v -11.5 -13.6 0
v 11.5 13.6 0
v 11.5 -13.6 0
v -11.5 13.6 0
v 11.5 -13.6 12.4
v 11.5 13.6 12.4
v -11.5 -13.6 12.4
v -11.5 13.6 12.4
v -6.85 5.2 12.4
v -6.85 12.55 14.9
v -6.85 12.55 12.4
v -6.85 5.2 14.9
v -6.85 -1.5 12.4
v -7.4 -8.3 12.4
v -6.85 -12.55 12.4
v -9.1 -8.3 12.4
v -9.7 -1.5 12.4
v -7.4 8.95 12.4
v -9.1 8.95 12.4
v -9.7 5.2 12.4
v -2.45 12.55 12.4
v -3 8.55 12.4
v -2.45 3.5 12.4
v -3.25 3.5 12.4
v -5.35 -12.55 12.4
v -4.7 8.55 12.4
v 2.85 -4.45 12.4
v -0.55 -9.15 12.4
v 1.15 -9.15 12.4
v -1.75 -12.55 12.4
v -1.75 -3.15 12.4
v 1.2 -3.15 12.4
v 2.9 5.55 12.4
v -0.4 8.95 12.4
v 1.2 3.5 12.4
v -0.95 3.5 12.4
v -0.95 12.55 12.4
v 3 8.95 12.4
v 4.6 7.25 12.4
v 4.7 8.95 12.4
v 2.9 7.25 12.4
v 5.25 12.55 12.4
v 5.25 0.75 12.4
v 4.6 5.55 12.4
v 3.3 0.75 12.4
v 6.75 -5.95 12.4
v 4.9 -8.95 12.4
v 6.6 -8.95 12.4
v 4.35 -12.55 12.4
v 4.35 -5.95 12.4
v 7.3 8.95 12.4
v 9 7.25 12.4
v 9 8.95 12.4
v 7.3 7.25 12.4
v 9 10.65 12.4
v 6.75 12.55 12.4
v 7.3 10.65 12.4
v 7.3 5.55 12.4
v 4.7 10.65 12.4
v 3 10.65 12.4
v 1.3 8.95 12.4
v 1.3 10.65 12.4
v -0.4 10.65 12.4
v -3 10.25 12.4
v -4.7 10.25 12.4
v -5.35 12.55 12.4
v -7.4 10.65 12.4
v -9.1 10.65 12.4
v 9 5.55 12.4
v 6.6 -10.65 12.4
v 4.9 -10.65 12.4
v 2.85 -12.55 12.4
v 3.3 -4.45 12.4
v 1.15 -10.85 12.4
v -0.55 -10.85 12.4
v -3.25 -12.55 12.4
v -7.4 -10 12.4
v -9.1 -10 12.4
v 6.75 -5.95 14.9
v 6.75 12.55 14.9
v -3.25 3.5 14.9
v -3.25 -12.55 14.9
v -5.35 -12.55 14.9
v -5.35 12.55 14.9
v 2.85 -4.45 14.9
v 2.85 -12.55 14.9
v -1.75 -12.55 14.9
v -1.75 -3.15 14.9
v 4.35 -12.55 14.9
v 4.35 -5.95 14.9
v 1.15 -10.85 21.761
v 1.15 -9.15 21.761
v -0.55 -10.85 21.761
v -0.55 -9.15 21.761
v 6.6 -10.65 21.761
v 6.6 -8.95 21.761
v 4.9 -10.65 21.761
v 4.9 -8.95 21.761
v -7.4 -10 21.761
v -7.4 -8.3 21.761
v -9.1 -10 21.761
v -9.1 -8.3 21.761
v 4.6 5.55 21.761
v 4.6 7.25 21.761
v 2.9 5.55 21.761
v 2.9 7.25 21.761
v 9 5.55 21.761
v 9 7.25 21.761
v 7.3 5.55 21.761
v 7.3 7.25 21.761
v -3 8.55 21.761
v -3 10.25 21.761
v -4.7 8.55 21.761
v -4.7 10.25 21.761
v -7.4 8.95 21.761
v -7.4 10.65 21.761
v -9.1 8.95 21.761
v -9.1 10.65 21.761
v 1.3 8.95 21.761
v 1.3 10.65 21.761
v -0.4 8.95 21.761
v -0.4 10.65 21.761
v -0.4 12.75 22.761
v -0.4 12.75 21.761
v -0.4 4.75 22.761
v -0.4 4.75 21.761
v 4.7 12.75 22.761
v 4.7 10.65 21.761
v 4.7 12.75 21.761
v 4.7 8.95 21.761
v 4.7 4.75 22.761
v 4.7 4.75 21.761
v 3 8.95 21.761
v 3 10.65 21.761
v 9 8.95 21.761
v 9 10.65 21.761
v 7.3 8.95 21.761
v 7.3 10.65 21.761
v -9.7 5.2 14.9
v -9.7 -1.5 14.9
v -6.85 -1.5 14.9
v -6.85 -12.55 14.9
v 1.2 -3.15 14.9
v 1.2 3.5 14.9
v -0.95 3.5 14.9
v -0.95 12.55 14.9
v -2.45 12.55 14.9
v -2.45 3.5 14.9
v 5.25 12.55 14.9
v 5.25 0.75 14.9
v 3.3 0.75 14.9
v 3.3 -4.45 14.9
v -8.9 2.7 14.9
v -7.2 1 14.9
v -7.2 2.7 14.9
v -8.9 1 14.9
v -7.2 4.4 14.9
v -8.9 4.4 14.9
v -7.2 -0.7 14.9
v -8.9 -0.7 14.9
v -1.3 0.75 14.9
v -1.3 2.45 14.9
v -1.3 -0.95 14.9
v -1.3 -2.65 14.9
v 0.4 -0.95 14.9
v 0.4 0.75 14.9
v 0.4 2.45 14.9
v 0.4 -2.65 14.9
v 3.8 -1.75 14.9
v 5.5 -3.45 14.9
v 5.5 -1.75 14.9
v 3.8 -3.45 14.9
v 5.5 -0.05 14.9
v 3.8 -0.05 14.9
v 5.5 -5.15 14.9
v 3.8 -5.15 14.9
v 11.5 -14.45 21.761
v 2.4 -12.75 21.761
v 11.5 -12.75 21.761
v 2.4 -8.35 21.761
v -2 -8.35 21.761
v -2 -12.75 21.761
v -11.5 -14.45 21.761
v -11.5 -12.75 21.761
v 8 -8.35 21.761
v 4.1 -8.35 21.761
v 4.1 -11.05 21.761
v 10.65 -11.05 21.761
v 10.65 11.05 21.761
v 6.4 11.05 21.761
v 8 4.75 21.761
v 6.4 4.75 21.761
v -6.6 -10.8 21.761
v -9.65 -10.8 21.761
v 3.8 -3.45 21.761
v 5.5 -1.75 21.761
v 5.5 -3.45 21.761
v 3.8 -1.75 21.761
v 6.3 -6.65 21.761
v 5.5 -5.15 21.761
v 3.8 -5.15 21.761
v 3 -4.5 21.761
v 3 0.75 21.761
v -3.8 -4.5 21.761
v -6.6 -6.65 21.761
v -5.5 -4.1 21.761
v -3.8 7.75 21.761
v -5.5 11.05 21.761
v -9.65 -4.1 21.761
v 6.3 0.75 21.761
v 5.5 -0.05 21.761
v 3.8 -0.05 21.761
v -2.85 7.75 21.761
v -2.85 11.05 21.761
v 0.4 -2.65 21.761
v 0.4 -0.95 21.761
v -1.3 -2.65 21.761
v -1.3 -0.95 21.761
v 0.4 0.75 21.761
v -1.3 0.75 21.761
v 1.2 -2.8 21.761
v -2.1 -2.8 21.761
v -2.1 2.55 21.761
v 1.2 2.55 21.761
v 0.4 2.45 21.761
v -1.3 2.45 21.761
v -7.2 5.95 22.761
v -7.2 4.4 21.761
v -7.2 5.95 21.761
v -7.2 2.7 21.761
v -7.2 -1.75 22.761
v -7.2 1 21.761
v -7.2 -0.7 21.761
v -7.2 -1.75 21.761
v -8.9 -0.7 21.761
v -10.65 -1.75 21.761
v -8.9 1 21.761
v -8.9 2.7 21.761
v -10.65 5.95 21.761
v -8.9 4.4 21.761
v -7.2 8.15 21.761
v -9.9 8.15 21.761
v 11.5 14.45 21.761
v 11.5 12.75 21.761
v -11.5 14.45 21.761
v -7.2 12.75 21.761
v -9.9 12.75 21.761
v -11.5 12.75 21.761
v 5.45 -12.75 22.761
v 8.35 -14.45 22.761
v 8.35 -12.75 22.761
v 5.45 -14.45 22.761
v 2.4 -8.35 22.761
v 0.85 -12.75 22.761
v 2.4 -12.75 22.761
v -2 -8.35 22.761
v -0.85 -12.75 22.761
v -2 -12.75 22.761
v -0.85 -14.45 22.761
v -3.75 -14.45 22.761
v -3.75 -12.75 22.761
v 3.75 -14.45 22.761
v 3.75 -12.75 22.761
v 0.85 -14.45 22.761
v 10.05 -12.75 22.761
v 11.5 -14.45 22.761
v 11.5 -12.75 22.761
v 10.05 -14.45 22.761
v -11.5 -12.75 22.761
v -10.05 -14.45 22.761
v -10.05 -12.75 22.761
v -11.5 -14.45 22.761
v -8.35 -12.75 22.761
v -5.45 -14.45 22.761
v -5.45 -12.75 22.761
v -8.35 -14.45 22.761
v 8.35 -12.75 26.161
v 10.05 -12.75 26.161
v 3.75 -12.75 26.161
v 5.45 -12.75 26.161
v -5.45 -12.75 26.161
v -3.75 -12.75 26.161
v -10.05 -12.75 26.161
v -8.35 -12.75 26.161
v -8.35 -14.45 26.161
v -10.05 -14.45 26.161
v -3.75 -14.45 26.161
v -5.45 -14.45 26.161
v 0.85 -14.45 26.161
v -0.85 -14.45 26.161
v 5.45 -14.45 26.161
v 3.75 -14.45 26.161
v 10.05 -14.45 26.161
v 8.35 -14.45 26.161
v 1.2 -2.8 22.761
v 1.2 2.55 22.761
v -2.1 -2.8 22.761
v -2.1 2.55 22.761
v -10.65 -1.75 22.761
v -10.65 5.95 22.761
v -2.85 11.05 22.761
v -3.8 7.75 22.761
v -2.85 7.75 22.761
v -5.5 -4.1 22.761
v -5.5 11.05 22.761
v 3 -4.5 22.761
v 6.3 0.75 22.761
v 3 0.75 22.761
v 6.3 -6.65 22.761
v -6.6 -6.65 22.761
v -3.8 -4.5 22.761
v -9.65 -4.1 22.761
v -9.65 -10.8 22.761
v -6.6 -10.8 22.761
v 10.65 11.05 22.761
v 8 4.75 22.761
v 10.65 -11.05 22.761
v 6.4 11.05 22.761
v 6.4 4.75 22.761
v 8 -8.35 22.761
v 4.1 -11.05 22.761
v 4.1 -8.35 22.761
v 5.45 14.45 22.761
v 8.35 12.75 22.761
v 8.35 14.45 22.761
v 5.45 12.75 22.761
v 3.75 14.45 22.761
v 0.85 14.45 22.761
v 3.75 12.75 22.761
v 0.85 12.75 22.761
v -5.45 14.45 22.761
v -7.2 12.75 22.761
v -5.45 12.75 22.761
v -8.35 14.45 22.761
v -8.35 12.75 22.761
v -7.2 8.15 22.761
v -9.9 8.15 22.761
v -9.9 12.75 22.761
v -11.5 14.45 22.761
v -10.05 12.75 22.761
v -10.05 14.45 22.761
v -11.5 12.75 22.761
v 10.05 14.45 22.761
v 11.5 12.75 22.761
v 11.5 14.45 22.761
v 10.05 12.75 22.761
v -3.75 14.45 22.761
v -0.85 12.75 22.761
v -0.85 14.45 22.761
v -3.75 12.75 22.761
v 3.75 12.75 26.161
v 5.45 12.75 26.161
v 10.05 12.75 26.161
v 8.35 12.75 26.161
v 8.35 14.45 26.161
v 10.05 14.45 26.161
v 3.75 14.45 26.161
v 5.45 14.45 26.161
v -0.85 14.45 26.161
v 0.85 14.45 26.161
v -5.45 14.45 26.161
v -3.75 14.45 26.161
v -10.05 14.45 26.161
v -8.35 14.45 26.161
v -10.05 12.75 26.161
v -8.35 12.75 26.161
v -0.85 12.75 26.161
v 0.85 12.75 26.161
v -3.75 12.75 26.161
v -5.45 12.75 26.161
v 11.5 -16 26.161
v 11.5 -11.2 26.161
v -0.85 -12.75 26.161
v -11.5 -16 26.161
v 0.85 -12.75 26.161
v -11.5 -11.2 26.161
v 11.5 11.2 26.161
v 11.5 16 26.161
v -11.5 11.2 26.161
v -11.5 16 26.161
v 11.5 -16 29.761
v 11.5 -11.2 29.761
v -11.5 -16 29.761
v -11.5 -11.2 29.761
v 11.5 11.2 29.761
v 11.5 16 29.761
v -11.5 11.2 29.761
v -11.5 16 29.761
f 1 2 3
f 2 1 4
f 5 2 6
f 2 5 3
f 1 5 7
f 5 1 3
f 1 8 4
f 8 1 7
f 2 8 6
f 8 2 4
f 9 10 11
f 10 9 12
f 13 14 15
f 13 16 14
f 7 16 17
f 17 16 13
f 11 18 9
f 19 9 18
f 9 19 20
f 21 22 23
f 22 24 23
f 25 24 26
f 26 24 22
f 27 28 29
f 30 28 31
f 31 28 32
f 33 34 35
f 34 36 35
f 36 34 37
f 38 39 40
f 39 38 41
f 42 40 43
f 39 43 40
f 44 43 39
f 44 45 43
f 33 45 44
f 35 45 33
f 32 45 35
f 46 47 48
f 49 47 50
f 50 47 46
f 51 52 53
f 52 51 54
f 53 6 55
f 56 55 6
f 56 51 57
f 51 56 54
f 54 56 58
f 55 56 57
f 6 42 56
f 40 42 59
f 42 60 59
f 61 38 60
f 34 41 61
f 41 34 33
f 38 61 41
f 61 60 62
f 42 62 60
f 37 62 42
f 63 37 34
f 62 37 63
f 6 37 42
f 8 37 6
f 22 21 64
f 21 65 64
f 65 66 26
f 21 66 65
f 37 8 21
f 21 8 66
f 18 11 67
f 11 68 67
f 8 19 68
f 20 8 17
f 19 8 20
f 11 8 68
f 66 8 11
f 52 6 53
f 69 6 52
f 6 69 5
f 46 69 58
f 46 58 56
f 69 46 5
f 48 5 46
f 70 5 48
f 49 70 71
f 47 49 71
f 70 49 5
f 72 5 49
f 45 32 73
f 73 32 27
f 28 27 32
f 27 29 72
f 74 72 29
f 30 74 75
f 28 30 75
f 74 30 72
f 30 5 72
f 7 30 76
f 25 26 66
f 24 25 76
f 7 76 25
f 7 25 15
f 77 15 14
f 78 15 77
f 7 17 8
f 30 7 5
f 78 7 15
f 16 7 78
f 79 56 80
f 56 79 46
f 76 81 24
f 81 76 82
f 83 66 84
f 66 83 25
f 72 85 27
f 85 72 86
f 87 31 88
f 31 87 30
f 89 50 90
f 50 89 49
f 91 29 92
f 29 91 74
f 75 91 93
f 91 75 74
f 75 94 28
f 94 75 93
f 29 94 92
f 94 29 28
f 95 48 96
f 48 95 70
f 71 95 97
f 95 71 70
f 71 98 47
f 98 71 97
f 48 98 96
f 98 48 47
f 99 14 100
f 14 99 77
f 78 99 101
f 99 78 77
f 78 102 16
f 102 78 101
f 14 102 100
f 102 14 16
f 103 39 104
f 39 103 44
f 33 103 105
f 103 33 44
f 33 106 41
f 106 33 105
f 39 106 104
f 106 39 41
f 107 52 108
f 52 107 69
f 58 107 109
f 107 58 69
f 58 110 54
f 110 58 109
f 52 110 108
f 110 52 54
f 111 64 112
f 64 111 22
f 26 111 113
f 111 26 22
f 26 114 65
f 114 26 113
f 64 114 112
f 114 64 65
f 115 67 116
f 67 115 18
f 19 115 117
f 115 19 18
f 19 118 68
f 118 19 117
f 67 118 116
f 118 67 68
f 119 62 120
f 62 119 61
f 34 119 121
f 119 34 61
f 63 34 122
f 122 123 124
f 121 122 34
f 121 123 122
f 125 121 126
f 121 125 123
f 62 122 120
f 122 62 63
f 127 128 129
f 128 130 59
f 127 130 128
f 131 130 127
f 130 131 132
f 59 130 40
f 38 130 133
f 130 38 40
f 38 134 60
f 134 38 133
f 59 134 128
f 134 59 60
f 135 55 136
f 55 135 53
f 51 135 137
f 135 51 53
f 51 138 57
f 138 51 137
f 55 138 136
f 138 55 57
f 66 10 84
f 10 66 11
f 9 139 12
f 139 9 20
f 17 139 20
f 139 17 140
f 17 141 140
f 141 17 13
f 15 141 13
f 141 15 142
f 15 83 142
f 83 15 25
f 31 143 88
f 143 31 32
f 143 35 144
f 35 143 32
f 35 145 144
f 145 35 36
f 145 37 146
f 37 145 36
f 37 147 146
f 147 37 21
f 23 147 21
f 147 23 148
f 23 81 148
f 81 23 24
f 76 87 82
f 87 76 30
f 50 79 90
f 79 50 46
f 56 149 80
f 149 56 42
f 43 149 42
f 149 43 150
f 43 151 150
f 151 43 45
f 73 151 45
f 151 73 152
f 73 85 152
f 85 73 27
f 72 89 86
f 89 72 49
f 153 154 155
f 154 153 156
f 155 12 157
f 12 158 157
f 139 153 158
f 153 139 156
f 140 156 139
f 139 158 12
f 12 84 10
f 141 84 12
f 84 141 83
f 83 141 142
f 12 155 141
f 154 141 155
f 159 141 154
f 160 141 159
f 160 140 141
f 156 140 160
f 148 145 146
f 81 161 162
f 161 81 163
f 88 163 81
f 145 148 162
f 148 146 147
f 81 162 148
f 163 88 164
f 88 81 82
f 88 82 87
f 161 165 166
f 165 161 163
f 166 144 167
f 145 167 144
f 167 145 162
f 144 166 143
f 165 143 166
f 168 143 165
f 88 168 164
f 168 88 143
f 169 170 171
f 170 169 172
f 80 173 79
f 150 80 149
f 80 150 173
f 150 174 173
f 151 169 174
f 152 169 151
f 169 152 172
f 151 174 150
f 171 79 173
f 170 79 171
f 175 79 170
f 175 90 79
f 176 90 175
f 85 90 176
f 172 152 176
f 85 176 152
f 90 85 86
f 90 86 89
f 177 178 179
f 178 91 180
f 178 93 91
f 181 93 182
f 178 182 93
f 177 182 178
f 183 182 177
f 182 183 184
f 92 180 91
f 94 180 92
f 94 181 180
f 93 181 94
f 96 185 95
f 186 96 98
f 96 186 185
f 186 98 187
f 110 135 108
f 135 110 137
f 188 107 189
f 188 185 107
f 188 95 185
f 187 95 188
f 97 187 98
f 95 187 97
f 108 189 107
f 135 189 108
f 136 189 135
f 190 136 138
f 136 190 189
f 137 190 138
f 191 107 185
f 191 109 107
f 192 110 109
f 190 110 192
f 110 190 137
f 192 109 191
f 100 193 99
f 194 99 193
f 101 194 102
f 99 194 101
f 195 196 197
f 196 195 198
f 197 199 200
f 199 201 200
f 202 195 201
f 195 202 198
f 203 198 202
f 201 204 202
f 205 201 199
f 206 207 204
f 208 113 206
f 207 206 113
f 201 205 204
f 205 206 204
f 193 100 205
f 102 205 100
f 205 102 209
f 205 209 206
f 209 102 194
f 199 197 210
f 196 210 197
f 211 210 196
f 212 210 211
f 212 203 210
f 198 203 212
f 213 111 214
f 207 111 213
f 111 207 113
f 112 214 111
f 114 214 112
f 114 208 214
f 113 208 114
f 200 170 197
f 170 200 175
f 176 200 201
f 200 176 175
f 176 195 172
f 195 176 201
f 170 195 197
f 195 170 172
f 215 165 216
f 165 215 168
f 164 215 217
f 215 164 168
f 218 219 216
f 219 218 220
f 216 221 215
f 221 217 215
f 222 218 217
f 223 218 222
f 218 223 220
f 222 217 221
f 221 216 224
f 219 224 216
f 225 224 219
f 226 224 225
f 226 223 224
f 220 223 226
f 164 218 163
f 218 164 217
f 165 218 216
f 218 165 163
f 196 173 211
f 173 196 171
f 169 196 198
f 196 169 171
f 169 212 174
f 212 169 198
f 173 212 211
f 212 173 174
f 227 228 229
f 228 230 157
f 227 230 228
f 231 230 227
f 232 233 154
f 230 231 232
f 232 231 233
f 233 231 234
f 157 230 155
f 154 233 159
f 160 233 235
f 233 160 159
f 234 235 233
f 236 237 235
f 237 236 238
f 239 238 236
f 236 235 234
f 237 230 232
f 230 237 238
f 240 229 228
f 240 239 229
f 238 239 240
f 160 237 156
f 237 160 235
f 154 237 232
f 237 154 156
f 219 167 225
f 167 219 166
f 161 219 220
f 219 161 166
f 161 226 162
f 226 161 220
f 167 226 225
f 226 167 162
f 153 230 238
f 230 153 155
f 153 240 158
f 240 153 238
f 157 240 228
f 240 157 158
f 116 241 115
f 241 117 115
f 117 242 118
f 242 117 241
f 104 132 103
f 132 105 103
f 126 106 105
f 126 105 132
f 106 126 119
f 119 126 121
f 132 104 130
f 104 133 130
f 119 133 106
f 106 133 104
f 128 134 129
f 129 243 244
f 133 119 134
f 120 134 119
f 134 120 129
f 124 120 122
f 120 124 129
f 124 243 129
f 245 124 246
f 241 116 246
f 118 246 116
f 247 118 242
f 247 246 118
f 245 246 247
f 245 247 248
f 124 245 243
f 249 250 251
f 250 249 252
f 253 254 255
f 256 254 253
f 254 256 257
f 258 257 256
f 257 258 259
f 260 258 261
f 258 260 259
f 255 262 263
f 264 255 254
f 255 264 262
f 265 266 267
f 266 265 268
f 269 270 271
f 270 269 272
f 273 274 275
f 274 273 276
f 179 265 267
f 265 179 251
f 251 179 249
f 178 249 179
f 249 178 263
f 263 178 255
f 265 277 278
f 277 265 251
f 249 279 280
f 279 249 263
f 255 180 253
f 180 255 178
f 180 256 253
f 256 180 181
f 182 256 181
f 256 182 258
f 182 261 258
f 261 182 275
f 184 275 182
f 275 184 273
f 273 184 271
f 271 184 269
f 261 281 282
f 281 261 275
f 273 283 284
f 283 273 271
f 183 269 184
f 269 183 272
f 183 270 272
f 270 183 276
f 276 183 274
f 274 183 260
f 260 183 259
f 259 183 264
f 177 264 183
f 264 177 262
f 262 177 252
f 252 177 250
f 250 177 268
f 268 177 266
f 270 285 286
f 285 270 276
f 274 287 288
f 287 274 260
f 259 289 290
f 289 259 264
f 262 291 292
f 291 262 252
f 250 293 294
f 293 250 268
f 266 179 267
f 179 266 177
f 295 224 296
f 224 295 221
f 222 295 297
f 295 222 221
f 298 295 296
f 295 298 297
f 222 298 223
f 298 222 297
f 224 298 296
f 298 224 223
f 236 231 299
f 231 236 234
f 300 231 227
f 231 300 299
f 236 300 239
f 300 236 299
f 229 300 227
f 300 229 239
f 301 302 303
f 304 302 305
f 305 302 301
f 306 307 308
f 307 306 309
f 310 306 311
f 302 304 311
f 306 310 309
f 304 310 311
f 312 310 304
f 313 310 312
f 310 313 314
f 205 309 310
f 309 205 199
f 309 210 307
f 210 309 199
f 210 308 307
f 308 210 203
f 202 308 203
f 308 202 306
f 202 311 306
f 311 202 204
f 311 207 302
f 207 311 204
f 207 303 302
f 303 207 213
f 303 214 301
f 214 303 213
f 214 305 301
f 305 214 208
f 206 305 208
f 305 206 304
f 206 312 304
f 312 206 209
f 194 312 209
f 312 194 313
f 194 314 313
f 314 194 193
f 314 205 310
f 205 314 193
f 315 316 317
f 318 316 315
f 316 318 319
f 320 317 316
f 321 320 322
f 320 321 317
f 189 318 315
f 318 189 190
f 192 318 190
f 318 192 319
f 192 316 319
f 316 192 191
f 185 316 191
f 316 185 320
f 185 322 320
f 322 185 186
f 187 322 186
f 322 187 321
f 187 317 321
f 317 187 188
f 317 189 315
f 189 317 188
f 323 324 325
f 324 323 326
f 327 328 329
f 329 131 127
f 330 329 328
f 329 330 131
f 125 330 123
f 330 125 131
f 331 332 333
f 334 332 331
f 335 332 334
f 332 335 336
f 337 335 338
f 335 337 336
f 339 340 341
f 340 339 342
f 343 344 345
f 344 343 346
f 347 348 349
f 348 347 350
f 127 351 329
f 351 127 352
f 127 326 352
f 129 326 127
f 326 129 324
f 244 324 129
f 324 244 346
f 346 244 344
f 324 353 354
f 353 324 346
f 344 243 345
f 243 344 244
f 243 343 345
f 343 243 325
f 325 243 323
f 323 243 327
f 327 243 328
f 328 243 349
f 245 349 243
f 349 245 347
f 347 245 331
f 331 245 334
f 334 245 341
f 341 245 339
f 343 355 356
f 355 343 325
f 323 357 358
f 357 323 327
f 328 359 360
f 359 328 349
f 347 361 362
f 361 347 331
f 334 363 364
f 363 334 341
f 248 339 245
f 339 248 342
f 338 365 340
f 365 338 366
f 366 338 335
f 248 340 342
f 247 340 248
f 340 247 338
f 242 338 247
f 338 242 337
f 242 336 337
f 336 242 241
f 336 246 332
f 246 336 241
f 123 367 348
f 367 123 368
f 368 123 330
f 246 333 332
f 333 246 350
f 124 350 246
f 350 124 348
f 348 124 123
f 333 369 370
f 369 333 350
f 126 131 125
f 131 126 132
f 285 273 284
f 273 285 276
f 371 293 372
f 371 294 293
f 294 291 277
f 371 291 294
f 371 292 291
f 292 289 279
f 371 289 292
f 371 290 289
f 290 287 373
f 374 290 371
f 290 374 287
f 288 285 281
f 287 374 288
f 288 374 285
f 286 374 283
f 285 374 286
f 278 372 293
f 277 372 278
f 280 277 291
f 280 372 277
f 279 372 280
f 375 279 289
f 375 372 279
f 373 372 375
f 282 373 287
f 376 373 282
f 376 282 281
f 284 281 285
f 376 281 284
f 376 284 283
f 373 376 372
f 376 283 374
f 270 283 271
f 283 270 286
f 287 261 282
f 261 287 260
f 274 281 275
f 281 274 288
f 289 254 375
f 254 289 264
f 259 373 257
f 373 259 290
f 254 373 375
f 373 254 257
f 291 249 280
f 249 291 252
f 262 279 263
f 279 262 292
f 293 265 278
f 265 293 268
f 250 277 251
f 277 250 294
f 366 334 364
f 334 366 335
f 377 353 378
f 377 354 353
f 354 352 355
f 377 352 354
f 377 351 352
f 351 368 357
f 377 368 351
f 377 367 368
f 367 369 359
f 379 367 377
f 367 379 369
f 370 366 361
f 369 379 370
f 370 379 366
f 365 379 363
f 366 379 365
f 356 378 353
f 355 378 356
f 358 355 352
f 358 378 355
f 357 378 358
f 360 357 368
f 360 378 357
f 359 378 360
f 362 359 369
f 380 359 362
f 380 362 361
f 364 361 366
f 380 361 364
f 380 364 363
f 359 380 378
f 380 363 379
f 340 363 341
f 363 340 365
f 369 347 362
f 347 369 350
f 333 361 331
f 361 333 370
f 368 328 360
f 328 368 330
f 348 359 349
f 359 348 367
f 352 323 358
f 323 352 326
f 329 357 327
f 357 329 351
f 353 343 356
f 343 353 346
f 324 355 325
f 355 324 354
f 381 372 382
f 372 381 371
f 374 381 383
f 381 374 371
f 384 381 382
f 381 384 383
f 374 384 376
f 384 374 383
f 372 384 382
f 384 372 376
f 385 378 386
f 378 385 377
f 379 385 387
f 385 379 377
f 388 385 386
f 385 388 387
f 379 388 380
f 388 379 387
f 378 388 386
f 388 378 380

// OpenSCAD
// Generated by SolidPython 0.4.2 on 2020-09-29 23:20:04
//!OpenSCAD

scale(v = 0.0100000000) {
	translate(v = [-1150, -1360, 0]) {
		union() {
			color(c = [0.4000000000, 0.4000000000, 0.4000000000]) {
				translate(v = [0, 0, 0]) {
					linear_extrude(height = 1000.0000000000) {
						polygon(paths = [[0, 1, 2, 3]], points = [[0, 0], [0, 2720], [2300, 2720], [2300, 0]]);
					}
				}
			}
			color(c = [0.2000000000, 0.6000000000, 0.2000000000]) {
				translate(v = [0, 0, 1000.0000000000]) {
					linear_extrude(height = 120.0000000000) {
						polygon(paths = [[0, 1, 2, 3]], points = [[0, 1305], [0, 2720], [2300, 2720], [2300, 1305]]);
					}
				}
			}
			color(c = [0.4000000000, 0.4000000000, 0.4000000000]) {
				translate(v = [0, 0, 1000.0000000000]) {
					linear_extrude(height = 120.0000000000) {
						polygon(paths = [[0, 1, 2, 3]], points = [[0, 0], [0, 1305], [2300, 1305], [2300, 0]]);
					}
				}
			}
			color(c = [0.9000000000, 0.6000000000, 0.6000000000]) {
				translate(v = [0, 0, 1120.0000000000]) {
					linear_extrude(height = 120.0000000000) {
						polygon(paths = [[0, 1, 2, 3]], points = [[200, 2065], [200, 2485], [465, 2485], [465, 2065]]);
					}
				}
			}
			color(c = [0.9000000000, 0.6000000000, 0.6000000000]) {
				translate(v = [0, 0, 1120.0000000000]) {
					linear_extrude(height = 120.0000000000) {
						polygon(paths = [[0, 1, 2, 3]], points = [[615, 2065], [615, 2485], [905, 2485], [905, 2065]]);
					}
				}
			}
			color(c = [0.9000000000, 0.6000000000, 0.6000000000]) {
				translate(v = [0, 0, 1120.0000000000]) {
					linear_extrude(height = 120.0000000000) {
						polygon(paths = [[0, 1, 2, 3, 4, 5]], points = [[1185, 1845], [1185, 2065], [1055, 2065], [1055, 2485], [1675, 2485], [1675, 1845]]);
					}
				}
			}
			color(c = [0.9000000000, 0.6000000000, 0.6000000000]) {
				translate(v = [0, 0, 1120.0000000000]) {
					linear_extrude(height = 120.0000000000) {
						polygon(paths = [[0, 1, 2, 3]], points = [[1825, 1845], [1825, 2485], [2090, 2485], [2090, 1845]]);
					}
				}
			}
			color(c = [0.9000000000, 0.6000000000, 0.9000000000]) {
				translate(v = [0, 0, 1120.0000000000]) {
					linear_extrude(height = 120.0000000000) {
						polygon(paths = [[0, 1, 2, 3]], points = [[200, 235], [200, 655], [465, 655], [465, 235]]);
					}
				}
			}
			color(c = [0.9000000000, 0.6000000000, 0.9000000000]) {
				translate(v = [0, 0, 1120.0000000000]) {
					linear_extrude(height = 120.0000000000) {
						polygon(paths = [[0, 1, 2, 3]], points = [[615, 235], [615, 655], [825, 655], [825, 235]]);
					}
				}
			}
			color(c = [0.9000000000, 0.6000000000, 0.9000000000]) {
				translate(v = [0, 0, 1120.0000000000]) {
					linear_extrude(height = 120.0000000000) {
						polygon(paths = [[0, 1, 2, 3]], points = [[975, 235], [975, 655], [1435, 655], [1435, 235]]);
					}
				}
			}
			color(c = [0.9000000000, 0.6000000000, 0.9000000000]) {
				translate(v = [0, 0, 1120.0000000000]) {
					linear_extrude(height = 120.0000000000) {
						polygon(paths = [[0, 1, 2, 3]], points = [[1585, 235], [1585, 655], [1850, 655], [1850, 235]]);
					}
				}
			}
			color(c = [0.2000000000, 0.6000000000, 0.2000000000]) {
				translate(v = [0, 0, 1120.0000000000]) {
					linear_extrude(height = 120.0000000000) {
						difference() {
							polygon(paths = [[0, 1, 2, 3]], points = [[0, 1305], [0, 2720], [2300, 2720], [2300, 1305]]);
							polygon(paths = [[0, 1, 2, 3]], points = [[1825, 1845], [2090, 1845], [2090, 2485], [1825, 2485]]);
							polygon(paths = [[0, 1, 2, 3]], points = [[200, 2065], [465, 2065], [465, 2485], [200, 2485]]);
							polygon(paths = [[0, 1, 2, 3]], points = [[615, 2065], [905, 2065], [905, 2485], [615, 2485]]);
							polygon(paths = [[0, 1, 2, 3, 4, 5]], points = [[1185, 1845], [1675, 1845], [1675, 2485], [1055, 2485], [1055, 2065], [1185, 2065]]);
						}
					}
				}
			}
			color(c = [0.4000000000, 0.4000000000, 0.4000000000]) {
				translate(v = [0, 0, 1120.0000000000]) {
					linear_extrude(height = 120.0000000000) {
						difference() {
							polygon(paths = [[0, 1, 2, 3]], points = [[0, 0], [0, 1305], [2300, 1305], [2300, 0]]);
							polygon(paths = [[0, 1, 2, 3]], points = [[200, 235], [465, 235], [465, 655], [200, 655]]);
							polygon(paths = [[0, 1, 2, 3]], points = [[615, 235], [825, 235], [825, 655], [615, 655]]);
							polygon(paths = [[0, 1, 2, 3]], points = [[975, 235], [1435, 235], [1435, 655], [975, 655]]);
							polygon(paths = [[0, 1, 2, 3]], points = [[1585, 235], [1850, 235], [1850, 655], [1585, 655]]);
						}
					}
				}
			}
			color(c = [0.1000000000, 0.1000000000, 0.1000000000]) {
				translate(v = [0, 0, 1240.0000000000]) {
					linear_extrude(height = 70.0000000000) {
						polygon(paths = [[0, 1, 2, 3]], points = [[1095, 275], [1095, 445], [1265, 445], [1265, 275]]);
					}
				}
			}
			color(c = [0.1000000000, 0.1000000000, 0.1000000000]) {
				translate(v = [0, 0, 1240.0000000000]) {
					linear_extrude(height = 70.0000000000) {
						polygon(paths = [[0, 1, 2, 3]], points = [[1640, 295], [1640, 465], [1810, 465], [1810, 295]]);
					}
				}
			}
			color(c = [0.1000000000, 0.1000000000, 0.1000000000]) {
				translate(v = [0, 0, 1240.0000000000]) {
					linear_extrude(height = 70.0000000000) {
						polygon(paths = [[0, 1, 2, 3]], points = [[240, 360], [240, 530], [410, 530], [410, 360]]);
					}
				}
			}
			color(c = [0.1000000000, 0.1000000000, 0.1000000000]) {
				translate(v = [0, 0, 1240.0000000000]) {
					linear_extrude(height = 70.0000000000) {
						polygon(paths = [[0, 1, 2, 3]], points = [[1440, 1915], [1440, 2085], [1610, 2085], [1610, 1915]]);
					}
				}
			}
			color(c = [0.1000000000, 0.1000000000, 0.1000000000]) {
				translate(v = [0, 0, 1240.0000000000]) {
					linear_extrude(height = 70.0000000000) {
						polygon(paths = [[0, 1, 2, 3]], points = [[1880, 1915], [1880, 2085], [2050, 2085], [2050, 1915]]);
					}
				}
			}
			color(c = [0.1000000000, 0.1000000000, 0.1000000000]) {
				translate(v = [0, 0, 1240.0000000000]) {
					linear_extrude(height = 70.0000000000) {
						polygon(paths = [[0, 1, 2, 3]], points = [[680, 2215], [680, 2385], [850, 2385], [850, 2215]]);
					}
				}
			}
			color(c = [0.1000000000, 0.1000000000, 0.1000000000]) {
				translate(v = [0, 0, 1240.0000000000]) {
					linear_extrude(height = 70.0000000000) {
						polygon(paths = [[0, 1, 2, 3]], points = [[240, 2255], [240, 2425], [410, 2425], [410, 2255]]);
					}
				}
			}
			color(c = [0.1000000000, 0.1000000000, 0.1000000000]) {
				translate(v = [0, 0, 1240.0000000000]) {
					linear_extrude(height = 70.0000000000) {
						polygon(paths = [[0, 1, 2, 3]], points = [[1110, 2255], [1110, 2425], [1280, 2425], [1280, 2255]]);
					}
				}
			}
			color(c = [0.1000000000, 0.1000000000, 0.1000000000]) {
				translate(v = [0, 0, 1240.0000000000]) {
					linear_extrude(height = 70.0000000000) {
						polygon(paths = [[0, 1, 2, 3]], points = [[1450, 2255], [1450, 2425], [1620, 2425], [1620, 2255]]);
					}
				}
			}
			color(c = [0.1000000000, 0.1000000000, 0.1000000000]) {
				translate(v = [0, 0, 1240.0000000000]) {
					linear_extrude(height = 70.0000000000) {
						polygon(paths = [[0, 1, 2, 3]], points = [[1880, 2255], [1880, 2425], [2050, 2425], [2050, 2255]]);
					}
				}
			}
			color(c = [1.0000000000, 1.0000000000, 1.0000000000]) {
				translate(v = [0, 0, 1240.0000000000]) {
					linear_extrude(height = 70.0000000000) {
						polygon(paths = [[0, 1, 2, 3, 4, 5, 6, 7]], points = [[465, 105], [465, 1210], [180, 1210], [180, 1880], [465, 1880], [465, 2615], [615, 2615], [615, 105]]);
					}
				}
			}
			color(c = [1.0000000000, 1.0000000000, 1.0000000000]) {
				translate(v = [0, 0, 1240.0000000000]) {
					linear_extrude(height = 70.0000000000) {
						polygon(paths = [[0, 1, 2, 3, 4, 5, 6, 7, 8, 9]], points = [[825, 105], [825, 1710], [905, 1710], [905, 2615], [1055, 2615], [1055, 1710], [1270, 1710], [1270, 1045], [975, 1045], [975, 105]]);
					}
				}
			}
			color(c = [1.0000000000, 1.0000000000, 1.0000000000]) {
				translate(v = [0, 0, 1240.0000000000]) {
					linear_extrude(height = 70.0000000000) {
						polygon(paths = [[0, 1, 2, 3, 4, 5, 6, 7, 8, 9]], points = [[1435, 105], [1435, 915], [1480, 915], [1480, 1435], [1675, 1435], [1675, 2615], [1825, 2615], [1825, 765], [1585, 765], [1585, 105]]);
					}
				}
			}
			color(c = [0.1000000000, 0.1000000000, 0.1000000000]) {
				translate(v = [0, 0, 1310.0000000000]) {
					linear_extrude(height = 180.0000000000) {
						polygon(paths = [[0, 1, 2, 3]], points = [[1095, 275], [1095, 445], [1265, 445], [1265, 275]]);
					}
				}
			}
			color(c = [0.1000000000, 0.1000000000, 0.1000000000]) {
				translate(v = [0, 0, 1310.0000000000]) {
					linear_extrude(height = 180.0000000000) {
						polygon(paths = [[0, 1, 2, 3]], points = [[1640, 295], [1640, 465], [1810, 465], [1810, 295]]);
					}
				}
			}
			color(c = [0.1000000000, 0.1000000000, 0.1000000000]) {
				translate(v = [0, 0, 1310.0000000000]) {
					linear_extrude(height = 180.0000000000) {
						polygon(paths = [[0, 1, 2, 3]], points = [[240, 360], [240, 530], [410, 530], [410, 360]]);
					}
				}
			}
			color(c = [0.1000000000, 0.1000000000, 0.1000000000]) {
				translate(v = [0, 0, 1310.0000000000]) {
					linear_extrude(height = 180.0000000000) {
						polygon(paths = [[0, 1, 2, 3]], points = [[1440, 1915], [1440, 2085], [1610, 2085], [1610, 1915]]);
					}
				}
			}
			color(c = [0.1000000000, 0.1000000000, 0.1000000000]) {
				translate(v = [0, 0, 1310.0000000000]) {
					linear_extrude(height = 180.0000000000) {
						polygon(paths = [[0, 1, 2, 3]], points = [[1880, 1915], [1880, 2085], [2050, 2085], [2050, 1915]]);
					}
				}
			}
			color(c = [0.1000000000, 0.1000000000, 0.1000000000]) {
				translate(v = [0, 0, 1310.0000000000]) {
					linear_extrude(height = 180.0000000000) {
						polygon(paths = [[0, 1, 2, 3]], points = [[680, 2215], [680, 2385], [850, 2385], [850, 2215]]);
					}
				}
			}
			color(c = [0.1000000000, 0.1000000000, 0.1000000000]) {
				translate(v = [0, 0, 1310.0000000000]) {
					linear_extrude(height = 180.0000000000) {
						polygon(paths = [[0, 1, 2, 3]], points = [[240, 2255], [240, 2425], [410, 2425], [410, 2255]]);
					}
				}
			}
			color(c = [0.1000000000, 0.1000000000, 0.1000000000]) {
				translate(v = [0, 0, 1310.0000000000]) {
					linear_extrude(height = 180.0000000000) {
						polygon(paths = [[0, 1, 2, 3]], points = [[1110, 2255], [1110, 2425], [1280, 2425], [1280, 2255]]);
					}
				}
			}
			color(c = [0.1000000000, 0.1000000000, 0.1000000000]) {
				translate(v = [0, 0, 1310.0000000000]) {
					linear_extrude(height = 180.0000000000) {
						polygon(paths = [[0, 1, 2, 3]], points = [[1450, 2255], [1450, 2425], [1620, 2425], [1620, 2255]]);
					}
				}
			}
			color(c = [0.1000000000, 0.1000000000, 0.1000000000]) {
				translate(v = [0, 0, 1310.0000000000]) {
					linear_extrude(height = 180.0000000000) {
						polygon(paths = [[0, 1, 2, 3]], points = [[1880, 2255], [1880, 2425], [2050, 2425], [2050, 2255]]);
					}
				}
			}
			color(c = [0.7000000000, 0, 0]) {
				translate(v = [0, 0, 1310.0000000000]) {
					linear_extrude(height = 180.0000000000) {
						polygon(paths = [[0, 1, 2, 3, 4, 5, 6, 7]], points = [[465, 105], [465, 1210], [180, 1210], [180, 1880], [465, 1880], [465, 2615], [615, 2615], [615, 105]]);
					}
				}
			}
			color(c = [0.7000000000, 0, 0]) {
				translate(v = [0, 0, 1310.0000000000]) {
					linear_extrude(height = 180.0000000000) {
						polygon(paths = [[0, 1, 2, 3, 4, 5, 6, 7, 8, 9]], points = [[825, 105], [825, 1710], [905, 1710], [905, 2615], [1055, 2615], [1055, 1710], [1270, 1710], [1270, 1045], [975, 1045], [975, 105]]);
					}
				}
			}
			color(c = [0.7000000000, 0, 0]) {
				translate(v = [0, 0, 1310.0000000000]) {
					linear_extrude(height = 180.0000000000) {
						polygon(paths = [[0, 1, 2, 3, 4, 5, 6, 7, 8, 9]], points = [[1435, 105], [1435, 915], [1480, 915], [1480, 1435], [1675, 1435], [1675, 2615], [1825, 2615], [1825, 765], [1585, 765], [1585, 105]]);
					}
				}
			}
			color(c = [0.1000000000, 0.1000000000, 0.1000000000]) {
				translate(v = [0, 0, 1490.0000000000]) {
					linear_extrude(height = 686.1000000000) {
						polygon(paths = [[0, 1, 2, 3]], points = [[1095, 275], [1095, 445], [1265, 445], [1265, 275]]);
					}
				}
			}
			color(c = [0.1000000000, 0.1000000000, 0.1000000000]) {
				translate(v = [0, 0, 1490.0000000000]) {
					linear_extrude(height = 686.1000000000) {
						polygon(paths = [[0, 1, 2, 3]], points = [[1640, 295], [1640, 465], [1810, 465], [1810, 295]]);
					}
				}
			}
			color(c = [0.1000000000, 0.1000000000, 0.1000000000]) {
				translate(v = [0, 0, 1490.0000000000]) {
					linear_extrude(height = 686.1000000000) {
						polygon(paths = [[0, 1, 2, 3]], points = [[240, 360], [240, 530], [410, 530], [410, 360]]);
					}
				}
			}
			color(c = [0.1000000000, 0.1000000000, 0.1000000000]) {
				translate(v = [0, 0, 1490.0000000000]) {
					linear_extrude(height = 686.1000000000) {
						polygon(paths = [[0, 1, 2, 3]], points = [[1530, 845], [1530, 1015], [1700, 1015], [1700, 845]]);
					}
				}
			}
			color(c = [0.1000000000, 0.1000000000, 0.1000000000]) {
				translate(v = [0, 0, 1490.0000000000]) {
					linear_extrude(height = 686.1000000000) {
						polygon(paths = [[0, 1, 2, 3]], points = [[1020, 1095], [1020, 1265], [1190, 1265], [1190, 1095]]);
					}
				}
			}
			color(c = [0.1000000000, 0.1000000000, 0.1000000000]) {
				translate(v = [0, 0, 1490.0000000000]) {
					linear_extrude(height = 686.1000000000) {
						polygon(paths = [[0, 1, 2, 3]], points = [[1530, 1185], [1530, 1355], [1700, 1355], [1700, 1185]]);
					}
				}
			}
			color(c = [0.1000000000, 0.1000000000, 0.1000000000]) {
				translate(v = [0, 0, 1490.0000000000]) {
					linear_extrude(height = 686.1000000000) {
						polygon(paths = [[0, 1, 2, 3]], points = [[260, 1290], [260, 1460], [430, 1460], [430, 1290]]);
					}
				}
			}
			color(c = [0.1000000000, 0.1000000000, 0.1000000000]) {
				translate(v = [0, 0, 1490.0000000000]) {
					linear_extrude(height = 686.1000000000) {
						polygon(paths = [[0, 1, 2, 3]], points = [[1020, 1435], [1020, 1605], [1190, 1605], [1190, 1435]]);
					}
				}
			}
			color(c = [0.1000000000, 0.1000000000, 0.1000000000]) {
				translate(v = [0, 0, 1490.0000000000]) {
					linear_extrude(height = 686.1000000000) {
						polygon(paths = [[0, 1, 2, 3]], points = [[260, 1630], [260, 1800], [430, 1800], [430, 1630]]);
					}
				}
			}
			color(c = [0.1000000000, 0.1000000000, 0.1000000000]) {
				translate(v = [0, 0, 1490.0000000000]) {
					linear_extrude(height = 686.1000000000) {
						polygon(paths = [[0, 1, 2, 3]], points = [[1440, 1915], [1440, 2085], [1610, 2085], [1610, 1915]]);
					}
				}
			}
			color(c = [0.1000000000, 0.1000000000, 0.1000000000]) {
				translate(v = [0, 0, 1490.0000000000]) {
					linear_extrude(height = 686.1000000000) {
						polygon(paths = [[0, 1, 2, 3]], points = [[1880, 1915], [1880, 2085], [2050, 2085], [2050, 1915]]);
					}
				}
			}
			color(c = [0.1000000000, 0.1000000000, 0.1000000000]) {
				translate(v = [0, 0, 1490.0000000000]) {
					linear_extrude(height = 686.1000000000) {
						polygon(paths = [[0, 1, 2, 3]], points = [[680, 2215], [680, 2385], [850, 2385], [850, 2215]]);
					}
				}
			}
			color(c = [0.1000000000, 0.1000000000, 0.1000000000]) {
				translate(v = [0, 0, 1490.0000000000]) {
					linear_extrude(height = 686.1000000000) {
						polygon(paths = [[0, 1, 2, 3]], points = [[240, 2255], [240, 2425], [410, 2425], [410, 2255]]);
					}
				}
			}
			color(c = [0.1000000000, 0.1000000000, 0.1000000000]) {
				translate(v = [0, 0, 1490.0000000000]) {
					linear_extrude(height = 686.1000000000) {
						polygon(paths = [[0, 1, 2, 3]], points = [[1110, 2255], [1110, 2425], [1280, 2425], [1280, 2255]]);
					}
				}
			}
			color(c = [0.1000000000, 0.1000000000, 0.1000000000]) {
				translate(v = [0, 0, 1490.0000000000]) {
					linear_extrude(height = 686.1000000000) {
						polygon(paths = [[0, 1, 2, 3]], points = [[1450, 2255], [1450, 2425], [1620, 2425], [1620, 2255]]);
					}
				}
			}
			color(c = [0.1000000000, 0.1000000000, 0.1000000000]) {
				translate(v = [0, 0, 1490.0000000000]) {
					linear_extrude(height = 686.1000000000) {
						polygon(paths = [[0, 1, 2, 3]], points = [[1880, 2255], [1880, 2425], [2050, 2425], [2050, 2255]]);
					}
				}
			}
			color(c = [0.9000000000, 0.6000000000, 0.6000000000]) {
				translate(v = [0, 0, 2176.1000000000]) {
					linear_extrude(height = 100.0000000000) {
						polygon(paths = [[0, 1, 2, 3, 4, 5, 6, 7]], points = [[0, -85], [0, 85], [950, 85], [950, 525], [1390, 525], [1390, 85], [2300, 85], [2300, -85]]);
					}
				}
			}
			color(c = [0.9000000000, 0.6000000000, 0.6000000000]) {
				translate(v = [0, 0, 2176.1000000000]) {
					linear_extrude(height = 100.0000000000) {
						polygon(paths = [[0, 1, 2, 3]], points = [[940, 1080], [940, 1615], [1270, 1615], [1270, 1080]]);
					}
				}
			}
			color(c = [0.9000000000, 0.6000000000, 0.6000000000]) {
				translate(v = [0, 0, 2176.1000000000]) {
					linear_extrude(height = 100.0000000000) {
						polygon(paths = [[0, 1, 2, 3]], points = [[85, 1185], [85, 1955], [430, 1955], [430, 1185]]);
					}
				}
			}
			color(c = [0.9000000000, 0.6000000000, 0.6000000000]) {
				translate(v = [0, 0, 2176.1000000000]) {
					linear_extrude(height = 100.0000000000) {
						polygon(paths = [[0, 1, 2, 3, 4, 5, 6, 7, 8, 9, 10, 11, 12, 13]], points = [[185, 280], [185, 950], [600, 950], [600, 2465], [865, 2465], [865, 2135], [770, 2135], [770, 910], [1450, 910], [1450, 1435], [1780, 1435], [1780, 695], [490, 695], [490, 280]]);
					}
				}
			}
			color(c = [0.9000000000, 0.6000000000, 0.6000000000]) {
				translate(v = [0, 0, 2176.1000000000]) {
					linear_extrude(height = 100.0000000000) {
						polygon(paths = [[0, 1, 2, 3, 4, 5, 6, 7]], points = [[1560, 255], [1560, 525], [1950, 525], [1950, 1835], [1790, 1835], [1790, 2465], [2215, 2465], [2215, 255]]);
					}
				}
			}
			color(c = [0.9000000000, 0.6000000000, 0.6000000000]) {
				translate(v = [0, 0, 2176.1000000000]) {
					linear_extrude(height = 100.0000000000) {
						polygon(paths = [[0, 1, 2, 3, 4, 5, 6, 7, 8, 9, 10, 11]], points = [[1110, 1835], [1110, 2635], [430, 2635], [430, 2175], [160, 2175], [160, 2635], [0, 2635], [0, 2805], [2300, 2805], [2300, 2635], [1620, 2635], [1620, 1835]]);
					}
				}
			}
			color(c = [0.5000000000, 0.5000000000, 0.5000000000]) {
				translate(v = [0, 0, 2276.1000000000]) {
					linear_extrude(height = 340.0000000000) {
						polygon(paths = [[0, 1, 2, 3]], points = [[145, -85], [145, 85], [315, 85], [315, -85]]);
					}
				}
			}
			color(c = [0.5000000000, 0.5000000000, 0.5000000000]) {
				translate(v = [0, 0, 2276.1000000000]) {
					linear_extrude(height = 340.0000000000) {
						polygon(paths = [[0, 1, 2, 3]], points = [[605, -85], [605, 85], [775, 85], [775, -85]]);
					}
				}
			}
			color(c = [0.5000000000, 0.5000000000, 0.5000000000]) {
				translate(v = [0, 0, 2276.1000000000]) {
					linear_extrude(height = 340.0000000000) {
						polygon(paths = [[0, 1, 2, 3]], points = [[1065, -85], [1065, 85], [1235, 85], [1235, -85]]);
					}
				}
			}
			color(c = [0.5000000000, 0.5000000000, 0.5000000000]) {
				translate(v = [0, 0, 2276.1000000000]) {
					linear_extrude(height = 340.0000000000) {
						polygon(paths = [[0, 1, 2, 3]], points = [[1525, -85], [1525, 85], [1695, 85], [1695, -85]]);
					}
				}
			}
			color(c = [0.5000000000, 0.5000000000, 0.5000000000]) {
				translate(v = [0, 0, 2276.1000000000]) {
					linear_extrude(height = 340.0000000000) {
						polygon(paths = [[0, 1, 2, 3]], points = [[1985, -85], [1985, 85], [2155, 85], [2155, -85]]);
					}
				}
			}
			color(c = [0.5000000000, 0.5000000000, 0.5000000000]) {
				translate(v = [0, 0, 2276.1000000000]) {
					linear_extrude(height = 340.0000000000) {
						polygon(paths = [[0, 1, 2, 3]], points = [[145, 2635], [145, 2805], [315, 2805], [315, 2635]]);
					}
				}
			}
			color(c = [0.5000000000, 0.5000000000, 0.5000000000]) {
				translate(v = [0, 0, 2276.1000000000]) {
					linear_extrude(height = 340.0000000000) {
						polygon(paths = [[0, 1, 2, 3]], points = [[605, 2635], [605, 2805], [775, 2805], [775, 2635]]);
					}
				}
			}
			color(c = [0.5000000000, 0.5000000000, 0.5000000000]) {
				translate(v = [0, 0, 2276.1000000000]) {
					linear_extrude(height = 340.0000000000) {
						polygon(paths = [[0, 1, 2, 3]], points = [[1065, 2635], [1065, 2805], [1235, 2805], [1235, 2635]]);
					}
				}
			}
			color(c = [0.5000000000, 0.5000000000, 0.5000000000]) {
				translate(v = [0, 0, 2276.1000000000]) {
					linear_extrude(height = 340.0000000000) {
						polygon(paths = [[0, 1, 2, 3]], points = [[1525, 2635], [1525, 2805], [1695, 2805], [1695, 2635]]);
					}
				}
			}
			color(c = [0.5000000000, 0.5000000000, 0.5000000000]) {
				translate(v = [0, 0, 2276.1000000000]) {
					linear_extrude(height = 340.0000000000) {
						polygon(paths = [[0, 1, 2, 3]], points = [[1985, 2635], [1985, 2805], [2155, 2805], [2155, 2635]]);
					}
				}
			}
			color(c = [0.3000000000, 0.3000000000, 1]) {
				translate(v = [0, 0, 2616.1000000000]) {
					linear_extrude(height = 360.0000000000) {
						polygon(paths = [[0, 1, 2, 3]], points = [[0, -240], [0, 240], [2300, 240], [2300, -240]]);
					}
				}
			}
			color(c = [0.3000000000, 0.3000000000, 1]) {
				translate(v = [0, 0, 2616.1000000000]) {
					linear_extrude(height = 360.0000000000) {
						polygon(paths = [[0, 1, 2, 3]], points = [[0, 2480], [0, 2960], [2300, 2960], [2300, 2480]]);
					}
				}
			}
		}
	}
}
